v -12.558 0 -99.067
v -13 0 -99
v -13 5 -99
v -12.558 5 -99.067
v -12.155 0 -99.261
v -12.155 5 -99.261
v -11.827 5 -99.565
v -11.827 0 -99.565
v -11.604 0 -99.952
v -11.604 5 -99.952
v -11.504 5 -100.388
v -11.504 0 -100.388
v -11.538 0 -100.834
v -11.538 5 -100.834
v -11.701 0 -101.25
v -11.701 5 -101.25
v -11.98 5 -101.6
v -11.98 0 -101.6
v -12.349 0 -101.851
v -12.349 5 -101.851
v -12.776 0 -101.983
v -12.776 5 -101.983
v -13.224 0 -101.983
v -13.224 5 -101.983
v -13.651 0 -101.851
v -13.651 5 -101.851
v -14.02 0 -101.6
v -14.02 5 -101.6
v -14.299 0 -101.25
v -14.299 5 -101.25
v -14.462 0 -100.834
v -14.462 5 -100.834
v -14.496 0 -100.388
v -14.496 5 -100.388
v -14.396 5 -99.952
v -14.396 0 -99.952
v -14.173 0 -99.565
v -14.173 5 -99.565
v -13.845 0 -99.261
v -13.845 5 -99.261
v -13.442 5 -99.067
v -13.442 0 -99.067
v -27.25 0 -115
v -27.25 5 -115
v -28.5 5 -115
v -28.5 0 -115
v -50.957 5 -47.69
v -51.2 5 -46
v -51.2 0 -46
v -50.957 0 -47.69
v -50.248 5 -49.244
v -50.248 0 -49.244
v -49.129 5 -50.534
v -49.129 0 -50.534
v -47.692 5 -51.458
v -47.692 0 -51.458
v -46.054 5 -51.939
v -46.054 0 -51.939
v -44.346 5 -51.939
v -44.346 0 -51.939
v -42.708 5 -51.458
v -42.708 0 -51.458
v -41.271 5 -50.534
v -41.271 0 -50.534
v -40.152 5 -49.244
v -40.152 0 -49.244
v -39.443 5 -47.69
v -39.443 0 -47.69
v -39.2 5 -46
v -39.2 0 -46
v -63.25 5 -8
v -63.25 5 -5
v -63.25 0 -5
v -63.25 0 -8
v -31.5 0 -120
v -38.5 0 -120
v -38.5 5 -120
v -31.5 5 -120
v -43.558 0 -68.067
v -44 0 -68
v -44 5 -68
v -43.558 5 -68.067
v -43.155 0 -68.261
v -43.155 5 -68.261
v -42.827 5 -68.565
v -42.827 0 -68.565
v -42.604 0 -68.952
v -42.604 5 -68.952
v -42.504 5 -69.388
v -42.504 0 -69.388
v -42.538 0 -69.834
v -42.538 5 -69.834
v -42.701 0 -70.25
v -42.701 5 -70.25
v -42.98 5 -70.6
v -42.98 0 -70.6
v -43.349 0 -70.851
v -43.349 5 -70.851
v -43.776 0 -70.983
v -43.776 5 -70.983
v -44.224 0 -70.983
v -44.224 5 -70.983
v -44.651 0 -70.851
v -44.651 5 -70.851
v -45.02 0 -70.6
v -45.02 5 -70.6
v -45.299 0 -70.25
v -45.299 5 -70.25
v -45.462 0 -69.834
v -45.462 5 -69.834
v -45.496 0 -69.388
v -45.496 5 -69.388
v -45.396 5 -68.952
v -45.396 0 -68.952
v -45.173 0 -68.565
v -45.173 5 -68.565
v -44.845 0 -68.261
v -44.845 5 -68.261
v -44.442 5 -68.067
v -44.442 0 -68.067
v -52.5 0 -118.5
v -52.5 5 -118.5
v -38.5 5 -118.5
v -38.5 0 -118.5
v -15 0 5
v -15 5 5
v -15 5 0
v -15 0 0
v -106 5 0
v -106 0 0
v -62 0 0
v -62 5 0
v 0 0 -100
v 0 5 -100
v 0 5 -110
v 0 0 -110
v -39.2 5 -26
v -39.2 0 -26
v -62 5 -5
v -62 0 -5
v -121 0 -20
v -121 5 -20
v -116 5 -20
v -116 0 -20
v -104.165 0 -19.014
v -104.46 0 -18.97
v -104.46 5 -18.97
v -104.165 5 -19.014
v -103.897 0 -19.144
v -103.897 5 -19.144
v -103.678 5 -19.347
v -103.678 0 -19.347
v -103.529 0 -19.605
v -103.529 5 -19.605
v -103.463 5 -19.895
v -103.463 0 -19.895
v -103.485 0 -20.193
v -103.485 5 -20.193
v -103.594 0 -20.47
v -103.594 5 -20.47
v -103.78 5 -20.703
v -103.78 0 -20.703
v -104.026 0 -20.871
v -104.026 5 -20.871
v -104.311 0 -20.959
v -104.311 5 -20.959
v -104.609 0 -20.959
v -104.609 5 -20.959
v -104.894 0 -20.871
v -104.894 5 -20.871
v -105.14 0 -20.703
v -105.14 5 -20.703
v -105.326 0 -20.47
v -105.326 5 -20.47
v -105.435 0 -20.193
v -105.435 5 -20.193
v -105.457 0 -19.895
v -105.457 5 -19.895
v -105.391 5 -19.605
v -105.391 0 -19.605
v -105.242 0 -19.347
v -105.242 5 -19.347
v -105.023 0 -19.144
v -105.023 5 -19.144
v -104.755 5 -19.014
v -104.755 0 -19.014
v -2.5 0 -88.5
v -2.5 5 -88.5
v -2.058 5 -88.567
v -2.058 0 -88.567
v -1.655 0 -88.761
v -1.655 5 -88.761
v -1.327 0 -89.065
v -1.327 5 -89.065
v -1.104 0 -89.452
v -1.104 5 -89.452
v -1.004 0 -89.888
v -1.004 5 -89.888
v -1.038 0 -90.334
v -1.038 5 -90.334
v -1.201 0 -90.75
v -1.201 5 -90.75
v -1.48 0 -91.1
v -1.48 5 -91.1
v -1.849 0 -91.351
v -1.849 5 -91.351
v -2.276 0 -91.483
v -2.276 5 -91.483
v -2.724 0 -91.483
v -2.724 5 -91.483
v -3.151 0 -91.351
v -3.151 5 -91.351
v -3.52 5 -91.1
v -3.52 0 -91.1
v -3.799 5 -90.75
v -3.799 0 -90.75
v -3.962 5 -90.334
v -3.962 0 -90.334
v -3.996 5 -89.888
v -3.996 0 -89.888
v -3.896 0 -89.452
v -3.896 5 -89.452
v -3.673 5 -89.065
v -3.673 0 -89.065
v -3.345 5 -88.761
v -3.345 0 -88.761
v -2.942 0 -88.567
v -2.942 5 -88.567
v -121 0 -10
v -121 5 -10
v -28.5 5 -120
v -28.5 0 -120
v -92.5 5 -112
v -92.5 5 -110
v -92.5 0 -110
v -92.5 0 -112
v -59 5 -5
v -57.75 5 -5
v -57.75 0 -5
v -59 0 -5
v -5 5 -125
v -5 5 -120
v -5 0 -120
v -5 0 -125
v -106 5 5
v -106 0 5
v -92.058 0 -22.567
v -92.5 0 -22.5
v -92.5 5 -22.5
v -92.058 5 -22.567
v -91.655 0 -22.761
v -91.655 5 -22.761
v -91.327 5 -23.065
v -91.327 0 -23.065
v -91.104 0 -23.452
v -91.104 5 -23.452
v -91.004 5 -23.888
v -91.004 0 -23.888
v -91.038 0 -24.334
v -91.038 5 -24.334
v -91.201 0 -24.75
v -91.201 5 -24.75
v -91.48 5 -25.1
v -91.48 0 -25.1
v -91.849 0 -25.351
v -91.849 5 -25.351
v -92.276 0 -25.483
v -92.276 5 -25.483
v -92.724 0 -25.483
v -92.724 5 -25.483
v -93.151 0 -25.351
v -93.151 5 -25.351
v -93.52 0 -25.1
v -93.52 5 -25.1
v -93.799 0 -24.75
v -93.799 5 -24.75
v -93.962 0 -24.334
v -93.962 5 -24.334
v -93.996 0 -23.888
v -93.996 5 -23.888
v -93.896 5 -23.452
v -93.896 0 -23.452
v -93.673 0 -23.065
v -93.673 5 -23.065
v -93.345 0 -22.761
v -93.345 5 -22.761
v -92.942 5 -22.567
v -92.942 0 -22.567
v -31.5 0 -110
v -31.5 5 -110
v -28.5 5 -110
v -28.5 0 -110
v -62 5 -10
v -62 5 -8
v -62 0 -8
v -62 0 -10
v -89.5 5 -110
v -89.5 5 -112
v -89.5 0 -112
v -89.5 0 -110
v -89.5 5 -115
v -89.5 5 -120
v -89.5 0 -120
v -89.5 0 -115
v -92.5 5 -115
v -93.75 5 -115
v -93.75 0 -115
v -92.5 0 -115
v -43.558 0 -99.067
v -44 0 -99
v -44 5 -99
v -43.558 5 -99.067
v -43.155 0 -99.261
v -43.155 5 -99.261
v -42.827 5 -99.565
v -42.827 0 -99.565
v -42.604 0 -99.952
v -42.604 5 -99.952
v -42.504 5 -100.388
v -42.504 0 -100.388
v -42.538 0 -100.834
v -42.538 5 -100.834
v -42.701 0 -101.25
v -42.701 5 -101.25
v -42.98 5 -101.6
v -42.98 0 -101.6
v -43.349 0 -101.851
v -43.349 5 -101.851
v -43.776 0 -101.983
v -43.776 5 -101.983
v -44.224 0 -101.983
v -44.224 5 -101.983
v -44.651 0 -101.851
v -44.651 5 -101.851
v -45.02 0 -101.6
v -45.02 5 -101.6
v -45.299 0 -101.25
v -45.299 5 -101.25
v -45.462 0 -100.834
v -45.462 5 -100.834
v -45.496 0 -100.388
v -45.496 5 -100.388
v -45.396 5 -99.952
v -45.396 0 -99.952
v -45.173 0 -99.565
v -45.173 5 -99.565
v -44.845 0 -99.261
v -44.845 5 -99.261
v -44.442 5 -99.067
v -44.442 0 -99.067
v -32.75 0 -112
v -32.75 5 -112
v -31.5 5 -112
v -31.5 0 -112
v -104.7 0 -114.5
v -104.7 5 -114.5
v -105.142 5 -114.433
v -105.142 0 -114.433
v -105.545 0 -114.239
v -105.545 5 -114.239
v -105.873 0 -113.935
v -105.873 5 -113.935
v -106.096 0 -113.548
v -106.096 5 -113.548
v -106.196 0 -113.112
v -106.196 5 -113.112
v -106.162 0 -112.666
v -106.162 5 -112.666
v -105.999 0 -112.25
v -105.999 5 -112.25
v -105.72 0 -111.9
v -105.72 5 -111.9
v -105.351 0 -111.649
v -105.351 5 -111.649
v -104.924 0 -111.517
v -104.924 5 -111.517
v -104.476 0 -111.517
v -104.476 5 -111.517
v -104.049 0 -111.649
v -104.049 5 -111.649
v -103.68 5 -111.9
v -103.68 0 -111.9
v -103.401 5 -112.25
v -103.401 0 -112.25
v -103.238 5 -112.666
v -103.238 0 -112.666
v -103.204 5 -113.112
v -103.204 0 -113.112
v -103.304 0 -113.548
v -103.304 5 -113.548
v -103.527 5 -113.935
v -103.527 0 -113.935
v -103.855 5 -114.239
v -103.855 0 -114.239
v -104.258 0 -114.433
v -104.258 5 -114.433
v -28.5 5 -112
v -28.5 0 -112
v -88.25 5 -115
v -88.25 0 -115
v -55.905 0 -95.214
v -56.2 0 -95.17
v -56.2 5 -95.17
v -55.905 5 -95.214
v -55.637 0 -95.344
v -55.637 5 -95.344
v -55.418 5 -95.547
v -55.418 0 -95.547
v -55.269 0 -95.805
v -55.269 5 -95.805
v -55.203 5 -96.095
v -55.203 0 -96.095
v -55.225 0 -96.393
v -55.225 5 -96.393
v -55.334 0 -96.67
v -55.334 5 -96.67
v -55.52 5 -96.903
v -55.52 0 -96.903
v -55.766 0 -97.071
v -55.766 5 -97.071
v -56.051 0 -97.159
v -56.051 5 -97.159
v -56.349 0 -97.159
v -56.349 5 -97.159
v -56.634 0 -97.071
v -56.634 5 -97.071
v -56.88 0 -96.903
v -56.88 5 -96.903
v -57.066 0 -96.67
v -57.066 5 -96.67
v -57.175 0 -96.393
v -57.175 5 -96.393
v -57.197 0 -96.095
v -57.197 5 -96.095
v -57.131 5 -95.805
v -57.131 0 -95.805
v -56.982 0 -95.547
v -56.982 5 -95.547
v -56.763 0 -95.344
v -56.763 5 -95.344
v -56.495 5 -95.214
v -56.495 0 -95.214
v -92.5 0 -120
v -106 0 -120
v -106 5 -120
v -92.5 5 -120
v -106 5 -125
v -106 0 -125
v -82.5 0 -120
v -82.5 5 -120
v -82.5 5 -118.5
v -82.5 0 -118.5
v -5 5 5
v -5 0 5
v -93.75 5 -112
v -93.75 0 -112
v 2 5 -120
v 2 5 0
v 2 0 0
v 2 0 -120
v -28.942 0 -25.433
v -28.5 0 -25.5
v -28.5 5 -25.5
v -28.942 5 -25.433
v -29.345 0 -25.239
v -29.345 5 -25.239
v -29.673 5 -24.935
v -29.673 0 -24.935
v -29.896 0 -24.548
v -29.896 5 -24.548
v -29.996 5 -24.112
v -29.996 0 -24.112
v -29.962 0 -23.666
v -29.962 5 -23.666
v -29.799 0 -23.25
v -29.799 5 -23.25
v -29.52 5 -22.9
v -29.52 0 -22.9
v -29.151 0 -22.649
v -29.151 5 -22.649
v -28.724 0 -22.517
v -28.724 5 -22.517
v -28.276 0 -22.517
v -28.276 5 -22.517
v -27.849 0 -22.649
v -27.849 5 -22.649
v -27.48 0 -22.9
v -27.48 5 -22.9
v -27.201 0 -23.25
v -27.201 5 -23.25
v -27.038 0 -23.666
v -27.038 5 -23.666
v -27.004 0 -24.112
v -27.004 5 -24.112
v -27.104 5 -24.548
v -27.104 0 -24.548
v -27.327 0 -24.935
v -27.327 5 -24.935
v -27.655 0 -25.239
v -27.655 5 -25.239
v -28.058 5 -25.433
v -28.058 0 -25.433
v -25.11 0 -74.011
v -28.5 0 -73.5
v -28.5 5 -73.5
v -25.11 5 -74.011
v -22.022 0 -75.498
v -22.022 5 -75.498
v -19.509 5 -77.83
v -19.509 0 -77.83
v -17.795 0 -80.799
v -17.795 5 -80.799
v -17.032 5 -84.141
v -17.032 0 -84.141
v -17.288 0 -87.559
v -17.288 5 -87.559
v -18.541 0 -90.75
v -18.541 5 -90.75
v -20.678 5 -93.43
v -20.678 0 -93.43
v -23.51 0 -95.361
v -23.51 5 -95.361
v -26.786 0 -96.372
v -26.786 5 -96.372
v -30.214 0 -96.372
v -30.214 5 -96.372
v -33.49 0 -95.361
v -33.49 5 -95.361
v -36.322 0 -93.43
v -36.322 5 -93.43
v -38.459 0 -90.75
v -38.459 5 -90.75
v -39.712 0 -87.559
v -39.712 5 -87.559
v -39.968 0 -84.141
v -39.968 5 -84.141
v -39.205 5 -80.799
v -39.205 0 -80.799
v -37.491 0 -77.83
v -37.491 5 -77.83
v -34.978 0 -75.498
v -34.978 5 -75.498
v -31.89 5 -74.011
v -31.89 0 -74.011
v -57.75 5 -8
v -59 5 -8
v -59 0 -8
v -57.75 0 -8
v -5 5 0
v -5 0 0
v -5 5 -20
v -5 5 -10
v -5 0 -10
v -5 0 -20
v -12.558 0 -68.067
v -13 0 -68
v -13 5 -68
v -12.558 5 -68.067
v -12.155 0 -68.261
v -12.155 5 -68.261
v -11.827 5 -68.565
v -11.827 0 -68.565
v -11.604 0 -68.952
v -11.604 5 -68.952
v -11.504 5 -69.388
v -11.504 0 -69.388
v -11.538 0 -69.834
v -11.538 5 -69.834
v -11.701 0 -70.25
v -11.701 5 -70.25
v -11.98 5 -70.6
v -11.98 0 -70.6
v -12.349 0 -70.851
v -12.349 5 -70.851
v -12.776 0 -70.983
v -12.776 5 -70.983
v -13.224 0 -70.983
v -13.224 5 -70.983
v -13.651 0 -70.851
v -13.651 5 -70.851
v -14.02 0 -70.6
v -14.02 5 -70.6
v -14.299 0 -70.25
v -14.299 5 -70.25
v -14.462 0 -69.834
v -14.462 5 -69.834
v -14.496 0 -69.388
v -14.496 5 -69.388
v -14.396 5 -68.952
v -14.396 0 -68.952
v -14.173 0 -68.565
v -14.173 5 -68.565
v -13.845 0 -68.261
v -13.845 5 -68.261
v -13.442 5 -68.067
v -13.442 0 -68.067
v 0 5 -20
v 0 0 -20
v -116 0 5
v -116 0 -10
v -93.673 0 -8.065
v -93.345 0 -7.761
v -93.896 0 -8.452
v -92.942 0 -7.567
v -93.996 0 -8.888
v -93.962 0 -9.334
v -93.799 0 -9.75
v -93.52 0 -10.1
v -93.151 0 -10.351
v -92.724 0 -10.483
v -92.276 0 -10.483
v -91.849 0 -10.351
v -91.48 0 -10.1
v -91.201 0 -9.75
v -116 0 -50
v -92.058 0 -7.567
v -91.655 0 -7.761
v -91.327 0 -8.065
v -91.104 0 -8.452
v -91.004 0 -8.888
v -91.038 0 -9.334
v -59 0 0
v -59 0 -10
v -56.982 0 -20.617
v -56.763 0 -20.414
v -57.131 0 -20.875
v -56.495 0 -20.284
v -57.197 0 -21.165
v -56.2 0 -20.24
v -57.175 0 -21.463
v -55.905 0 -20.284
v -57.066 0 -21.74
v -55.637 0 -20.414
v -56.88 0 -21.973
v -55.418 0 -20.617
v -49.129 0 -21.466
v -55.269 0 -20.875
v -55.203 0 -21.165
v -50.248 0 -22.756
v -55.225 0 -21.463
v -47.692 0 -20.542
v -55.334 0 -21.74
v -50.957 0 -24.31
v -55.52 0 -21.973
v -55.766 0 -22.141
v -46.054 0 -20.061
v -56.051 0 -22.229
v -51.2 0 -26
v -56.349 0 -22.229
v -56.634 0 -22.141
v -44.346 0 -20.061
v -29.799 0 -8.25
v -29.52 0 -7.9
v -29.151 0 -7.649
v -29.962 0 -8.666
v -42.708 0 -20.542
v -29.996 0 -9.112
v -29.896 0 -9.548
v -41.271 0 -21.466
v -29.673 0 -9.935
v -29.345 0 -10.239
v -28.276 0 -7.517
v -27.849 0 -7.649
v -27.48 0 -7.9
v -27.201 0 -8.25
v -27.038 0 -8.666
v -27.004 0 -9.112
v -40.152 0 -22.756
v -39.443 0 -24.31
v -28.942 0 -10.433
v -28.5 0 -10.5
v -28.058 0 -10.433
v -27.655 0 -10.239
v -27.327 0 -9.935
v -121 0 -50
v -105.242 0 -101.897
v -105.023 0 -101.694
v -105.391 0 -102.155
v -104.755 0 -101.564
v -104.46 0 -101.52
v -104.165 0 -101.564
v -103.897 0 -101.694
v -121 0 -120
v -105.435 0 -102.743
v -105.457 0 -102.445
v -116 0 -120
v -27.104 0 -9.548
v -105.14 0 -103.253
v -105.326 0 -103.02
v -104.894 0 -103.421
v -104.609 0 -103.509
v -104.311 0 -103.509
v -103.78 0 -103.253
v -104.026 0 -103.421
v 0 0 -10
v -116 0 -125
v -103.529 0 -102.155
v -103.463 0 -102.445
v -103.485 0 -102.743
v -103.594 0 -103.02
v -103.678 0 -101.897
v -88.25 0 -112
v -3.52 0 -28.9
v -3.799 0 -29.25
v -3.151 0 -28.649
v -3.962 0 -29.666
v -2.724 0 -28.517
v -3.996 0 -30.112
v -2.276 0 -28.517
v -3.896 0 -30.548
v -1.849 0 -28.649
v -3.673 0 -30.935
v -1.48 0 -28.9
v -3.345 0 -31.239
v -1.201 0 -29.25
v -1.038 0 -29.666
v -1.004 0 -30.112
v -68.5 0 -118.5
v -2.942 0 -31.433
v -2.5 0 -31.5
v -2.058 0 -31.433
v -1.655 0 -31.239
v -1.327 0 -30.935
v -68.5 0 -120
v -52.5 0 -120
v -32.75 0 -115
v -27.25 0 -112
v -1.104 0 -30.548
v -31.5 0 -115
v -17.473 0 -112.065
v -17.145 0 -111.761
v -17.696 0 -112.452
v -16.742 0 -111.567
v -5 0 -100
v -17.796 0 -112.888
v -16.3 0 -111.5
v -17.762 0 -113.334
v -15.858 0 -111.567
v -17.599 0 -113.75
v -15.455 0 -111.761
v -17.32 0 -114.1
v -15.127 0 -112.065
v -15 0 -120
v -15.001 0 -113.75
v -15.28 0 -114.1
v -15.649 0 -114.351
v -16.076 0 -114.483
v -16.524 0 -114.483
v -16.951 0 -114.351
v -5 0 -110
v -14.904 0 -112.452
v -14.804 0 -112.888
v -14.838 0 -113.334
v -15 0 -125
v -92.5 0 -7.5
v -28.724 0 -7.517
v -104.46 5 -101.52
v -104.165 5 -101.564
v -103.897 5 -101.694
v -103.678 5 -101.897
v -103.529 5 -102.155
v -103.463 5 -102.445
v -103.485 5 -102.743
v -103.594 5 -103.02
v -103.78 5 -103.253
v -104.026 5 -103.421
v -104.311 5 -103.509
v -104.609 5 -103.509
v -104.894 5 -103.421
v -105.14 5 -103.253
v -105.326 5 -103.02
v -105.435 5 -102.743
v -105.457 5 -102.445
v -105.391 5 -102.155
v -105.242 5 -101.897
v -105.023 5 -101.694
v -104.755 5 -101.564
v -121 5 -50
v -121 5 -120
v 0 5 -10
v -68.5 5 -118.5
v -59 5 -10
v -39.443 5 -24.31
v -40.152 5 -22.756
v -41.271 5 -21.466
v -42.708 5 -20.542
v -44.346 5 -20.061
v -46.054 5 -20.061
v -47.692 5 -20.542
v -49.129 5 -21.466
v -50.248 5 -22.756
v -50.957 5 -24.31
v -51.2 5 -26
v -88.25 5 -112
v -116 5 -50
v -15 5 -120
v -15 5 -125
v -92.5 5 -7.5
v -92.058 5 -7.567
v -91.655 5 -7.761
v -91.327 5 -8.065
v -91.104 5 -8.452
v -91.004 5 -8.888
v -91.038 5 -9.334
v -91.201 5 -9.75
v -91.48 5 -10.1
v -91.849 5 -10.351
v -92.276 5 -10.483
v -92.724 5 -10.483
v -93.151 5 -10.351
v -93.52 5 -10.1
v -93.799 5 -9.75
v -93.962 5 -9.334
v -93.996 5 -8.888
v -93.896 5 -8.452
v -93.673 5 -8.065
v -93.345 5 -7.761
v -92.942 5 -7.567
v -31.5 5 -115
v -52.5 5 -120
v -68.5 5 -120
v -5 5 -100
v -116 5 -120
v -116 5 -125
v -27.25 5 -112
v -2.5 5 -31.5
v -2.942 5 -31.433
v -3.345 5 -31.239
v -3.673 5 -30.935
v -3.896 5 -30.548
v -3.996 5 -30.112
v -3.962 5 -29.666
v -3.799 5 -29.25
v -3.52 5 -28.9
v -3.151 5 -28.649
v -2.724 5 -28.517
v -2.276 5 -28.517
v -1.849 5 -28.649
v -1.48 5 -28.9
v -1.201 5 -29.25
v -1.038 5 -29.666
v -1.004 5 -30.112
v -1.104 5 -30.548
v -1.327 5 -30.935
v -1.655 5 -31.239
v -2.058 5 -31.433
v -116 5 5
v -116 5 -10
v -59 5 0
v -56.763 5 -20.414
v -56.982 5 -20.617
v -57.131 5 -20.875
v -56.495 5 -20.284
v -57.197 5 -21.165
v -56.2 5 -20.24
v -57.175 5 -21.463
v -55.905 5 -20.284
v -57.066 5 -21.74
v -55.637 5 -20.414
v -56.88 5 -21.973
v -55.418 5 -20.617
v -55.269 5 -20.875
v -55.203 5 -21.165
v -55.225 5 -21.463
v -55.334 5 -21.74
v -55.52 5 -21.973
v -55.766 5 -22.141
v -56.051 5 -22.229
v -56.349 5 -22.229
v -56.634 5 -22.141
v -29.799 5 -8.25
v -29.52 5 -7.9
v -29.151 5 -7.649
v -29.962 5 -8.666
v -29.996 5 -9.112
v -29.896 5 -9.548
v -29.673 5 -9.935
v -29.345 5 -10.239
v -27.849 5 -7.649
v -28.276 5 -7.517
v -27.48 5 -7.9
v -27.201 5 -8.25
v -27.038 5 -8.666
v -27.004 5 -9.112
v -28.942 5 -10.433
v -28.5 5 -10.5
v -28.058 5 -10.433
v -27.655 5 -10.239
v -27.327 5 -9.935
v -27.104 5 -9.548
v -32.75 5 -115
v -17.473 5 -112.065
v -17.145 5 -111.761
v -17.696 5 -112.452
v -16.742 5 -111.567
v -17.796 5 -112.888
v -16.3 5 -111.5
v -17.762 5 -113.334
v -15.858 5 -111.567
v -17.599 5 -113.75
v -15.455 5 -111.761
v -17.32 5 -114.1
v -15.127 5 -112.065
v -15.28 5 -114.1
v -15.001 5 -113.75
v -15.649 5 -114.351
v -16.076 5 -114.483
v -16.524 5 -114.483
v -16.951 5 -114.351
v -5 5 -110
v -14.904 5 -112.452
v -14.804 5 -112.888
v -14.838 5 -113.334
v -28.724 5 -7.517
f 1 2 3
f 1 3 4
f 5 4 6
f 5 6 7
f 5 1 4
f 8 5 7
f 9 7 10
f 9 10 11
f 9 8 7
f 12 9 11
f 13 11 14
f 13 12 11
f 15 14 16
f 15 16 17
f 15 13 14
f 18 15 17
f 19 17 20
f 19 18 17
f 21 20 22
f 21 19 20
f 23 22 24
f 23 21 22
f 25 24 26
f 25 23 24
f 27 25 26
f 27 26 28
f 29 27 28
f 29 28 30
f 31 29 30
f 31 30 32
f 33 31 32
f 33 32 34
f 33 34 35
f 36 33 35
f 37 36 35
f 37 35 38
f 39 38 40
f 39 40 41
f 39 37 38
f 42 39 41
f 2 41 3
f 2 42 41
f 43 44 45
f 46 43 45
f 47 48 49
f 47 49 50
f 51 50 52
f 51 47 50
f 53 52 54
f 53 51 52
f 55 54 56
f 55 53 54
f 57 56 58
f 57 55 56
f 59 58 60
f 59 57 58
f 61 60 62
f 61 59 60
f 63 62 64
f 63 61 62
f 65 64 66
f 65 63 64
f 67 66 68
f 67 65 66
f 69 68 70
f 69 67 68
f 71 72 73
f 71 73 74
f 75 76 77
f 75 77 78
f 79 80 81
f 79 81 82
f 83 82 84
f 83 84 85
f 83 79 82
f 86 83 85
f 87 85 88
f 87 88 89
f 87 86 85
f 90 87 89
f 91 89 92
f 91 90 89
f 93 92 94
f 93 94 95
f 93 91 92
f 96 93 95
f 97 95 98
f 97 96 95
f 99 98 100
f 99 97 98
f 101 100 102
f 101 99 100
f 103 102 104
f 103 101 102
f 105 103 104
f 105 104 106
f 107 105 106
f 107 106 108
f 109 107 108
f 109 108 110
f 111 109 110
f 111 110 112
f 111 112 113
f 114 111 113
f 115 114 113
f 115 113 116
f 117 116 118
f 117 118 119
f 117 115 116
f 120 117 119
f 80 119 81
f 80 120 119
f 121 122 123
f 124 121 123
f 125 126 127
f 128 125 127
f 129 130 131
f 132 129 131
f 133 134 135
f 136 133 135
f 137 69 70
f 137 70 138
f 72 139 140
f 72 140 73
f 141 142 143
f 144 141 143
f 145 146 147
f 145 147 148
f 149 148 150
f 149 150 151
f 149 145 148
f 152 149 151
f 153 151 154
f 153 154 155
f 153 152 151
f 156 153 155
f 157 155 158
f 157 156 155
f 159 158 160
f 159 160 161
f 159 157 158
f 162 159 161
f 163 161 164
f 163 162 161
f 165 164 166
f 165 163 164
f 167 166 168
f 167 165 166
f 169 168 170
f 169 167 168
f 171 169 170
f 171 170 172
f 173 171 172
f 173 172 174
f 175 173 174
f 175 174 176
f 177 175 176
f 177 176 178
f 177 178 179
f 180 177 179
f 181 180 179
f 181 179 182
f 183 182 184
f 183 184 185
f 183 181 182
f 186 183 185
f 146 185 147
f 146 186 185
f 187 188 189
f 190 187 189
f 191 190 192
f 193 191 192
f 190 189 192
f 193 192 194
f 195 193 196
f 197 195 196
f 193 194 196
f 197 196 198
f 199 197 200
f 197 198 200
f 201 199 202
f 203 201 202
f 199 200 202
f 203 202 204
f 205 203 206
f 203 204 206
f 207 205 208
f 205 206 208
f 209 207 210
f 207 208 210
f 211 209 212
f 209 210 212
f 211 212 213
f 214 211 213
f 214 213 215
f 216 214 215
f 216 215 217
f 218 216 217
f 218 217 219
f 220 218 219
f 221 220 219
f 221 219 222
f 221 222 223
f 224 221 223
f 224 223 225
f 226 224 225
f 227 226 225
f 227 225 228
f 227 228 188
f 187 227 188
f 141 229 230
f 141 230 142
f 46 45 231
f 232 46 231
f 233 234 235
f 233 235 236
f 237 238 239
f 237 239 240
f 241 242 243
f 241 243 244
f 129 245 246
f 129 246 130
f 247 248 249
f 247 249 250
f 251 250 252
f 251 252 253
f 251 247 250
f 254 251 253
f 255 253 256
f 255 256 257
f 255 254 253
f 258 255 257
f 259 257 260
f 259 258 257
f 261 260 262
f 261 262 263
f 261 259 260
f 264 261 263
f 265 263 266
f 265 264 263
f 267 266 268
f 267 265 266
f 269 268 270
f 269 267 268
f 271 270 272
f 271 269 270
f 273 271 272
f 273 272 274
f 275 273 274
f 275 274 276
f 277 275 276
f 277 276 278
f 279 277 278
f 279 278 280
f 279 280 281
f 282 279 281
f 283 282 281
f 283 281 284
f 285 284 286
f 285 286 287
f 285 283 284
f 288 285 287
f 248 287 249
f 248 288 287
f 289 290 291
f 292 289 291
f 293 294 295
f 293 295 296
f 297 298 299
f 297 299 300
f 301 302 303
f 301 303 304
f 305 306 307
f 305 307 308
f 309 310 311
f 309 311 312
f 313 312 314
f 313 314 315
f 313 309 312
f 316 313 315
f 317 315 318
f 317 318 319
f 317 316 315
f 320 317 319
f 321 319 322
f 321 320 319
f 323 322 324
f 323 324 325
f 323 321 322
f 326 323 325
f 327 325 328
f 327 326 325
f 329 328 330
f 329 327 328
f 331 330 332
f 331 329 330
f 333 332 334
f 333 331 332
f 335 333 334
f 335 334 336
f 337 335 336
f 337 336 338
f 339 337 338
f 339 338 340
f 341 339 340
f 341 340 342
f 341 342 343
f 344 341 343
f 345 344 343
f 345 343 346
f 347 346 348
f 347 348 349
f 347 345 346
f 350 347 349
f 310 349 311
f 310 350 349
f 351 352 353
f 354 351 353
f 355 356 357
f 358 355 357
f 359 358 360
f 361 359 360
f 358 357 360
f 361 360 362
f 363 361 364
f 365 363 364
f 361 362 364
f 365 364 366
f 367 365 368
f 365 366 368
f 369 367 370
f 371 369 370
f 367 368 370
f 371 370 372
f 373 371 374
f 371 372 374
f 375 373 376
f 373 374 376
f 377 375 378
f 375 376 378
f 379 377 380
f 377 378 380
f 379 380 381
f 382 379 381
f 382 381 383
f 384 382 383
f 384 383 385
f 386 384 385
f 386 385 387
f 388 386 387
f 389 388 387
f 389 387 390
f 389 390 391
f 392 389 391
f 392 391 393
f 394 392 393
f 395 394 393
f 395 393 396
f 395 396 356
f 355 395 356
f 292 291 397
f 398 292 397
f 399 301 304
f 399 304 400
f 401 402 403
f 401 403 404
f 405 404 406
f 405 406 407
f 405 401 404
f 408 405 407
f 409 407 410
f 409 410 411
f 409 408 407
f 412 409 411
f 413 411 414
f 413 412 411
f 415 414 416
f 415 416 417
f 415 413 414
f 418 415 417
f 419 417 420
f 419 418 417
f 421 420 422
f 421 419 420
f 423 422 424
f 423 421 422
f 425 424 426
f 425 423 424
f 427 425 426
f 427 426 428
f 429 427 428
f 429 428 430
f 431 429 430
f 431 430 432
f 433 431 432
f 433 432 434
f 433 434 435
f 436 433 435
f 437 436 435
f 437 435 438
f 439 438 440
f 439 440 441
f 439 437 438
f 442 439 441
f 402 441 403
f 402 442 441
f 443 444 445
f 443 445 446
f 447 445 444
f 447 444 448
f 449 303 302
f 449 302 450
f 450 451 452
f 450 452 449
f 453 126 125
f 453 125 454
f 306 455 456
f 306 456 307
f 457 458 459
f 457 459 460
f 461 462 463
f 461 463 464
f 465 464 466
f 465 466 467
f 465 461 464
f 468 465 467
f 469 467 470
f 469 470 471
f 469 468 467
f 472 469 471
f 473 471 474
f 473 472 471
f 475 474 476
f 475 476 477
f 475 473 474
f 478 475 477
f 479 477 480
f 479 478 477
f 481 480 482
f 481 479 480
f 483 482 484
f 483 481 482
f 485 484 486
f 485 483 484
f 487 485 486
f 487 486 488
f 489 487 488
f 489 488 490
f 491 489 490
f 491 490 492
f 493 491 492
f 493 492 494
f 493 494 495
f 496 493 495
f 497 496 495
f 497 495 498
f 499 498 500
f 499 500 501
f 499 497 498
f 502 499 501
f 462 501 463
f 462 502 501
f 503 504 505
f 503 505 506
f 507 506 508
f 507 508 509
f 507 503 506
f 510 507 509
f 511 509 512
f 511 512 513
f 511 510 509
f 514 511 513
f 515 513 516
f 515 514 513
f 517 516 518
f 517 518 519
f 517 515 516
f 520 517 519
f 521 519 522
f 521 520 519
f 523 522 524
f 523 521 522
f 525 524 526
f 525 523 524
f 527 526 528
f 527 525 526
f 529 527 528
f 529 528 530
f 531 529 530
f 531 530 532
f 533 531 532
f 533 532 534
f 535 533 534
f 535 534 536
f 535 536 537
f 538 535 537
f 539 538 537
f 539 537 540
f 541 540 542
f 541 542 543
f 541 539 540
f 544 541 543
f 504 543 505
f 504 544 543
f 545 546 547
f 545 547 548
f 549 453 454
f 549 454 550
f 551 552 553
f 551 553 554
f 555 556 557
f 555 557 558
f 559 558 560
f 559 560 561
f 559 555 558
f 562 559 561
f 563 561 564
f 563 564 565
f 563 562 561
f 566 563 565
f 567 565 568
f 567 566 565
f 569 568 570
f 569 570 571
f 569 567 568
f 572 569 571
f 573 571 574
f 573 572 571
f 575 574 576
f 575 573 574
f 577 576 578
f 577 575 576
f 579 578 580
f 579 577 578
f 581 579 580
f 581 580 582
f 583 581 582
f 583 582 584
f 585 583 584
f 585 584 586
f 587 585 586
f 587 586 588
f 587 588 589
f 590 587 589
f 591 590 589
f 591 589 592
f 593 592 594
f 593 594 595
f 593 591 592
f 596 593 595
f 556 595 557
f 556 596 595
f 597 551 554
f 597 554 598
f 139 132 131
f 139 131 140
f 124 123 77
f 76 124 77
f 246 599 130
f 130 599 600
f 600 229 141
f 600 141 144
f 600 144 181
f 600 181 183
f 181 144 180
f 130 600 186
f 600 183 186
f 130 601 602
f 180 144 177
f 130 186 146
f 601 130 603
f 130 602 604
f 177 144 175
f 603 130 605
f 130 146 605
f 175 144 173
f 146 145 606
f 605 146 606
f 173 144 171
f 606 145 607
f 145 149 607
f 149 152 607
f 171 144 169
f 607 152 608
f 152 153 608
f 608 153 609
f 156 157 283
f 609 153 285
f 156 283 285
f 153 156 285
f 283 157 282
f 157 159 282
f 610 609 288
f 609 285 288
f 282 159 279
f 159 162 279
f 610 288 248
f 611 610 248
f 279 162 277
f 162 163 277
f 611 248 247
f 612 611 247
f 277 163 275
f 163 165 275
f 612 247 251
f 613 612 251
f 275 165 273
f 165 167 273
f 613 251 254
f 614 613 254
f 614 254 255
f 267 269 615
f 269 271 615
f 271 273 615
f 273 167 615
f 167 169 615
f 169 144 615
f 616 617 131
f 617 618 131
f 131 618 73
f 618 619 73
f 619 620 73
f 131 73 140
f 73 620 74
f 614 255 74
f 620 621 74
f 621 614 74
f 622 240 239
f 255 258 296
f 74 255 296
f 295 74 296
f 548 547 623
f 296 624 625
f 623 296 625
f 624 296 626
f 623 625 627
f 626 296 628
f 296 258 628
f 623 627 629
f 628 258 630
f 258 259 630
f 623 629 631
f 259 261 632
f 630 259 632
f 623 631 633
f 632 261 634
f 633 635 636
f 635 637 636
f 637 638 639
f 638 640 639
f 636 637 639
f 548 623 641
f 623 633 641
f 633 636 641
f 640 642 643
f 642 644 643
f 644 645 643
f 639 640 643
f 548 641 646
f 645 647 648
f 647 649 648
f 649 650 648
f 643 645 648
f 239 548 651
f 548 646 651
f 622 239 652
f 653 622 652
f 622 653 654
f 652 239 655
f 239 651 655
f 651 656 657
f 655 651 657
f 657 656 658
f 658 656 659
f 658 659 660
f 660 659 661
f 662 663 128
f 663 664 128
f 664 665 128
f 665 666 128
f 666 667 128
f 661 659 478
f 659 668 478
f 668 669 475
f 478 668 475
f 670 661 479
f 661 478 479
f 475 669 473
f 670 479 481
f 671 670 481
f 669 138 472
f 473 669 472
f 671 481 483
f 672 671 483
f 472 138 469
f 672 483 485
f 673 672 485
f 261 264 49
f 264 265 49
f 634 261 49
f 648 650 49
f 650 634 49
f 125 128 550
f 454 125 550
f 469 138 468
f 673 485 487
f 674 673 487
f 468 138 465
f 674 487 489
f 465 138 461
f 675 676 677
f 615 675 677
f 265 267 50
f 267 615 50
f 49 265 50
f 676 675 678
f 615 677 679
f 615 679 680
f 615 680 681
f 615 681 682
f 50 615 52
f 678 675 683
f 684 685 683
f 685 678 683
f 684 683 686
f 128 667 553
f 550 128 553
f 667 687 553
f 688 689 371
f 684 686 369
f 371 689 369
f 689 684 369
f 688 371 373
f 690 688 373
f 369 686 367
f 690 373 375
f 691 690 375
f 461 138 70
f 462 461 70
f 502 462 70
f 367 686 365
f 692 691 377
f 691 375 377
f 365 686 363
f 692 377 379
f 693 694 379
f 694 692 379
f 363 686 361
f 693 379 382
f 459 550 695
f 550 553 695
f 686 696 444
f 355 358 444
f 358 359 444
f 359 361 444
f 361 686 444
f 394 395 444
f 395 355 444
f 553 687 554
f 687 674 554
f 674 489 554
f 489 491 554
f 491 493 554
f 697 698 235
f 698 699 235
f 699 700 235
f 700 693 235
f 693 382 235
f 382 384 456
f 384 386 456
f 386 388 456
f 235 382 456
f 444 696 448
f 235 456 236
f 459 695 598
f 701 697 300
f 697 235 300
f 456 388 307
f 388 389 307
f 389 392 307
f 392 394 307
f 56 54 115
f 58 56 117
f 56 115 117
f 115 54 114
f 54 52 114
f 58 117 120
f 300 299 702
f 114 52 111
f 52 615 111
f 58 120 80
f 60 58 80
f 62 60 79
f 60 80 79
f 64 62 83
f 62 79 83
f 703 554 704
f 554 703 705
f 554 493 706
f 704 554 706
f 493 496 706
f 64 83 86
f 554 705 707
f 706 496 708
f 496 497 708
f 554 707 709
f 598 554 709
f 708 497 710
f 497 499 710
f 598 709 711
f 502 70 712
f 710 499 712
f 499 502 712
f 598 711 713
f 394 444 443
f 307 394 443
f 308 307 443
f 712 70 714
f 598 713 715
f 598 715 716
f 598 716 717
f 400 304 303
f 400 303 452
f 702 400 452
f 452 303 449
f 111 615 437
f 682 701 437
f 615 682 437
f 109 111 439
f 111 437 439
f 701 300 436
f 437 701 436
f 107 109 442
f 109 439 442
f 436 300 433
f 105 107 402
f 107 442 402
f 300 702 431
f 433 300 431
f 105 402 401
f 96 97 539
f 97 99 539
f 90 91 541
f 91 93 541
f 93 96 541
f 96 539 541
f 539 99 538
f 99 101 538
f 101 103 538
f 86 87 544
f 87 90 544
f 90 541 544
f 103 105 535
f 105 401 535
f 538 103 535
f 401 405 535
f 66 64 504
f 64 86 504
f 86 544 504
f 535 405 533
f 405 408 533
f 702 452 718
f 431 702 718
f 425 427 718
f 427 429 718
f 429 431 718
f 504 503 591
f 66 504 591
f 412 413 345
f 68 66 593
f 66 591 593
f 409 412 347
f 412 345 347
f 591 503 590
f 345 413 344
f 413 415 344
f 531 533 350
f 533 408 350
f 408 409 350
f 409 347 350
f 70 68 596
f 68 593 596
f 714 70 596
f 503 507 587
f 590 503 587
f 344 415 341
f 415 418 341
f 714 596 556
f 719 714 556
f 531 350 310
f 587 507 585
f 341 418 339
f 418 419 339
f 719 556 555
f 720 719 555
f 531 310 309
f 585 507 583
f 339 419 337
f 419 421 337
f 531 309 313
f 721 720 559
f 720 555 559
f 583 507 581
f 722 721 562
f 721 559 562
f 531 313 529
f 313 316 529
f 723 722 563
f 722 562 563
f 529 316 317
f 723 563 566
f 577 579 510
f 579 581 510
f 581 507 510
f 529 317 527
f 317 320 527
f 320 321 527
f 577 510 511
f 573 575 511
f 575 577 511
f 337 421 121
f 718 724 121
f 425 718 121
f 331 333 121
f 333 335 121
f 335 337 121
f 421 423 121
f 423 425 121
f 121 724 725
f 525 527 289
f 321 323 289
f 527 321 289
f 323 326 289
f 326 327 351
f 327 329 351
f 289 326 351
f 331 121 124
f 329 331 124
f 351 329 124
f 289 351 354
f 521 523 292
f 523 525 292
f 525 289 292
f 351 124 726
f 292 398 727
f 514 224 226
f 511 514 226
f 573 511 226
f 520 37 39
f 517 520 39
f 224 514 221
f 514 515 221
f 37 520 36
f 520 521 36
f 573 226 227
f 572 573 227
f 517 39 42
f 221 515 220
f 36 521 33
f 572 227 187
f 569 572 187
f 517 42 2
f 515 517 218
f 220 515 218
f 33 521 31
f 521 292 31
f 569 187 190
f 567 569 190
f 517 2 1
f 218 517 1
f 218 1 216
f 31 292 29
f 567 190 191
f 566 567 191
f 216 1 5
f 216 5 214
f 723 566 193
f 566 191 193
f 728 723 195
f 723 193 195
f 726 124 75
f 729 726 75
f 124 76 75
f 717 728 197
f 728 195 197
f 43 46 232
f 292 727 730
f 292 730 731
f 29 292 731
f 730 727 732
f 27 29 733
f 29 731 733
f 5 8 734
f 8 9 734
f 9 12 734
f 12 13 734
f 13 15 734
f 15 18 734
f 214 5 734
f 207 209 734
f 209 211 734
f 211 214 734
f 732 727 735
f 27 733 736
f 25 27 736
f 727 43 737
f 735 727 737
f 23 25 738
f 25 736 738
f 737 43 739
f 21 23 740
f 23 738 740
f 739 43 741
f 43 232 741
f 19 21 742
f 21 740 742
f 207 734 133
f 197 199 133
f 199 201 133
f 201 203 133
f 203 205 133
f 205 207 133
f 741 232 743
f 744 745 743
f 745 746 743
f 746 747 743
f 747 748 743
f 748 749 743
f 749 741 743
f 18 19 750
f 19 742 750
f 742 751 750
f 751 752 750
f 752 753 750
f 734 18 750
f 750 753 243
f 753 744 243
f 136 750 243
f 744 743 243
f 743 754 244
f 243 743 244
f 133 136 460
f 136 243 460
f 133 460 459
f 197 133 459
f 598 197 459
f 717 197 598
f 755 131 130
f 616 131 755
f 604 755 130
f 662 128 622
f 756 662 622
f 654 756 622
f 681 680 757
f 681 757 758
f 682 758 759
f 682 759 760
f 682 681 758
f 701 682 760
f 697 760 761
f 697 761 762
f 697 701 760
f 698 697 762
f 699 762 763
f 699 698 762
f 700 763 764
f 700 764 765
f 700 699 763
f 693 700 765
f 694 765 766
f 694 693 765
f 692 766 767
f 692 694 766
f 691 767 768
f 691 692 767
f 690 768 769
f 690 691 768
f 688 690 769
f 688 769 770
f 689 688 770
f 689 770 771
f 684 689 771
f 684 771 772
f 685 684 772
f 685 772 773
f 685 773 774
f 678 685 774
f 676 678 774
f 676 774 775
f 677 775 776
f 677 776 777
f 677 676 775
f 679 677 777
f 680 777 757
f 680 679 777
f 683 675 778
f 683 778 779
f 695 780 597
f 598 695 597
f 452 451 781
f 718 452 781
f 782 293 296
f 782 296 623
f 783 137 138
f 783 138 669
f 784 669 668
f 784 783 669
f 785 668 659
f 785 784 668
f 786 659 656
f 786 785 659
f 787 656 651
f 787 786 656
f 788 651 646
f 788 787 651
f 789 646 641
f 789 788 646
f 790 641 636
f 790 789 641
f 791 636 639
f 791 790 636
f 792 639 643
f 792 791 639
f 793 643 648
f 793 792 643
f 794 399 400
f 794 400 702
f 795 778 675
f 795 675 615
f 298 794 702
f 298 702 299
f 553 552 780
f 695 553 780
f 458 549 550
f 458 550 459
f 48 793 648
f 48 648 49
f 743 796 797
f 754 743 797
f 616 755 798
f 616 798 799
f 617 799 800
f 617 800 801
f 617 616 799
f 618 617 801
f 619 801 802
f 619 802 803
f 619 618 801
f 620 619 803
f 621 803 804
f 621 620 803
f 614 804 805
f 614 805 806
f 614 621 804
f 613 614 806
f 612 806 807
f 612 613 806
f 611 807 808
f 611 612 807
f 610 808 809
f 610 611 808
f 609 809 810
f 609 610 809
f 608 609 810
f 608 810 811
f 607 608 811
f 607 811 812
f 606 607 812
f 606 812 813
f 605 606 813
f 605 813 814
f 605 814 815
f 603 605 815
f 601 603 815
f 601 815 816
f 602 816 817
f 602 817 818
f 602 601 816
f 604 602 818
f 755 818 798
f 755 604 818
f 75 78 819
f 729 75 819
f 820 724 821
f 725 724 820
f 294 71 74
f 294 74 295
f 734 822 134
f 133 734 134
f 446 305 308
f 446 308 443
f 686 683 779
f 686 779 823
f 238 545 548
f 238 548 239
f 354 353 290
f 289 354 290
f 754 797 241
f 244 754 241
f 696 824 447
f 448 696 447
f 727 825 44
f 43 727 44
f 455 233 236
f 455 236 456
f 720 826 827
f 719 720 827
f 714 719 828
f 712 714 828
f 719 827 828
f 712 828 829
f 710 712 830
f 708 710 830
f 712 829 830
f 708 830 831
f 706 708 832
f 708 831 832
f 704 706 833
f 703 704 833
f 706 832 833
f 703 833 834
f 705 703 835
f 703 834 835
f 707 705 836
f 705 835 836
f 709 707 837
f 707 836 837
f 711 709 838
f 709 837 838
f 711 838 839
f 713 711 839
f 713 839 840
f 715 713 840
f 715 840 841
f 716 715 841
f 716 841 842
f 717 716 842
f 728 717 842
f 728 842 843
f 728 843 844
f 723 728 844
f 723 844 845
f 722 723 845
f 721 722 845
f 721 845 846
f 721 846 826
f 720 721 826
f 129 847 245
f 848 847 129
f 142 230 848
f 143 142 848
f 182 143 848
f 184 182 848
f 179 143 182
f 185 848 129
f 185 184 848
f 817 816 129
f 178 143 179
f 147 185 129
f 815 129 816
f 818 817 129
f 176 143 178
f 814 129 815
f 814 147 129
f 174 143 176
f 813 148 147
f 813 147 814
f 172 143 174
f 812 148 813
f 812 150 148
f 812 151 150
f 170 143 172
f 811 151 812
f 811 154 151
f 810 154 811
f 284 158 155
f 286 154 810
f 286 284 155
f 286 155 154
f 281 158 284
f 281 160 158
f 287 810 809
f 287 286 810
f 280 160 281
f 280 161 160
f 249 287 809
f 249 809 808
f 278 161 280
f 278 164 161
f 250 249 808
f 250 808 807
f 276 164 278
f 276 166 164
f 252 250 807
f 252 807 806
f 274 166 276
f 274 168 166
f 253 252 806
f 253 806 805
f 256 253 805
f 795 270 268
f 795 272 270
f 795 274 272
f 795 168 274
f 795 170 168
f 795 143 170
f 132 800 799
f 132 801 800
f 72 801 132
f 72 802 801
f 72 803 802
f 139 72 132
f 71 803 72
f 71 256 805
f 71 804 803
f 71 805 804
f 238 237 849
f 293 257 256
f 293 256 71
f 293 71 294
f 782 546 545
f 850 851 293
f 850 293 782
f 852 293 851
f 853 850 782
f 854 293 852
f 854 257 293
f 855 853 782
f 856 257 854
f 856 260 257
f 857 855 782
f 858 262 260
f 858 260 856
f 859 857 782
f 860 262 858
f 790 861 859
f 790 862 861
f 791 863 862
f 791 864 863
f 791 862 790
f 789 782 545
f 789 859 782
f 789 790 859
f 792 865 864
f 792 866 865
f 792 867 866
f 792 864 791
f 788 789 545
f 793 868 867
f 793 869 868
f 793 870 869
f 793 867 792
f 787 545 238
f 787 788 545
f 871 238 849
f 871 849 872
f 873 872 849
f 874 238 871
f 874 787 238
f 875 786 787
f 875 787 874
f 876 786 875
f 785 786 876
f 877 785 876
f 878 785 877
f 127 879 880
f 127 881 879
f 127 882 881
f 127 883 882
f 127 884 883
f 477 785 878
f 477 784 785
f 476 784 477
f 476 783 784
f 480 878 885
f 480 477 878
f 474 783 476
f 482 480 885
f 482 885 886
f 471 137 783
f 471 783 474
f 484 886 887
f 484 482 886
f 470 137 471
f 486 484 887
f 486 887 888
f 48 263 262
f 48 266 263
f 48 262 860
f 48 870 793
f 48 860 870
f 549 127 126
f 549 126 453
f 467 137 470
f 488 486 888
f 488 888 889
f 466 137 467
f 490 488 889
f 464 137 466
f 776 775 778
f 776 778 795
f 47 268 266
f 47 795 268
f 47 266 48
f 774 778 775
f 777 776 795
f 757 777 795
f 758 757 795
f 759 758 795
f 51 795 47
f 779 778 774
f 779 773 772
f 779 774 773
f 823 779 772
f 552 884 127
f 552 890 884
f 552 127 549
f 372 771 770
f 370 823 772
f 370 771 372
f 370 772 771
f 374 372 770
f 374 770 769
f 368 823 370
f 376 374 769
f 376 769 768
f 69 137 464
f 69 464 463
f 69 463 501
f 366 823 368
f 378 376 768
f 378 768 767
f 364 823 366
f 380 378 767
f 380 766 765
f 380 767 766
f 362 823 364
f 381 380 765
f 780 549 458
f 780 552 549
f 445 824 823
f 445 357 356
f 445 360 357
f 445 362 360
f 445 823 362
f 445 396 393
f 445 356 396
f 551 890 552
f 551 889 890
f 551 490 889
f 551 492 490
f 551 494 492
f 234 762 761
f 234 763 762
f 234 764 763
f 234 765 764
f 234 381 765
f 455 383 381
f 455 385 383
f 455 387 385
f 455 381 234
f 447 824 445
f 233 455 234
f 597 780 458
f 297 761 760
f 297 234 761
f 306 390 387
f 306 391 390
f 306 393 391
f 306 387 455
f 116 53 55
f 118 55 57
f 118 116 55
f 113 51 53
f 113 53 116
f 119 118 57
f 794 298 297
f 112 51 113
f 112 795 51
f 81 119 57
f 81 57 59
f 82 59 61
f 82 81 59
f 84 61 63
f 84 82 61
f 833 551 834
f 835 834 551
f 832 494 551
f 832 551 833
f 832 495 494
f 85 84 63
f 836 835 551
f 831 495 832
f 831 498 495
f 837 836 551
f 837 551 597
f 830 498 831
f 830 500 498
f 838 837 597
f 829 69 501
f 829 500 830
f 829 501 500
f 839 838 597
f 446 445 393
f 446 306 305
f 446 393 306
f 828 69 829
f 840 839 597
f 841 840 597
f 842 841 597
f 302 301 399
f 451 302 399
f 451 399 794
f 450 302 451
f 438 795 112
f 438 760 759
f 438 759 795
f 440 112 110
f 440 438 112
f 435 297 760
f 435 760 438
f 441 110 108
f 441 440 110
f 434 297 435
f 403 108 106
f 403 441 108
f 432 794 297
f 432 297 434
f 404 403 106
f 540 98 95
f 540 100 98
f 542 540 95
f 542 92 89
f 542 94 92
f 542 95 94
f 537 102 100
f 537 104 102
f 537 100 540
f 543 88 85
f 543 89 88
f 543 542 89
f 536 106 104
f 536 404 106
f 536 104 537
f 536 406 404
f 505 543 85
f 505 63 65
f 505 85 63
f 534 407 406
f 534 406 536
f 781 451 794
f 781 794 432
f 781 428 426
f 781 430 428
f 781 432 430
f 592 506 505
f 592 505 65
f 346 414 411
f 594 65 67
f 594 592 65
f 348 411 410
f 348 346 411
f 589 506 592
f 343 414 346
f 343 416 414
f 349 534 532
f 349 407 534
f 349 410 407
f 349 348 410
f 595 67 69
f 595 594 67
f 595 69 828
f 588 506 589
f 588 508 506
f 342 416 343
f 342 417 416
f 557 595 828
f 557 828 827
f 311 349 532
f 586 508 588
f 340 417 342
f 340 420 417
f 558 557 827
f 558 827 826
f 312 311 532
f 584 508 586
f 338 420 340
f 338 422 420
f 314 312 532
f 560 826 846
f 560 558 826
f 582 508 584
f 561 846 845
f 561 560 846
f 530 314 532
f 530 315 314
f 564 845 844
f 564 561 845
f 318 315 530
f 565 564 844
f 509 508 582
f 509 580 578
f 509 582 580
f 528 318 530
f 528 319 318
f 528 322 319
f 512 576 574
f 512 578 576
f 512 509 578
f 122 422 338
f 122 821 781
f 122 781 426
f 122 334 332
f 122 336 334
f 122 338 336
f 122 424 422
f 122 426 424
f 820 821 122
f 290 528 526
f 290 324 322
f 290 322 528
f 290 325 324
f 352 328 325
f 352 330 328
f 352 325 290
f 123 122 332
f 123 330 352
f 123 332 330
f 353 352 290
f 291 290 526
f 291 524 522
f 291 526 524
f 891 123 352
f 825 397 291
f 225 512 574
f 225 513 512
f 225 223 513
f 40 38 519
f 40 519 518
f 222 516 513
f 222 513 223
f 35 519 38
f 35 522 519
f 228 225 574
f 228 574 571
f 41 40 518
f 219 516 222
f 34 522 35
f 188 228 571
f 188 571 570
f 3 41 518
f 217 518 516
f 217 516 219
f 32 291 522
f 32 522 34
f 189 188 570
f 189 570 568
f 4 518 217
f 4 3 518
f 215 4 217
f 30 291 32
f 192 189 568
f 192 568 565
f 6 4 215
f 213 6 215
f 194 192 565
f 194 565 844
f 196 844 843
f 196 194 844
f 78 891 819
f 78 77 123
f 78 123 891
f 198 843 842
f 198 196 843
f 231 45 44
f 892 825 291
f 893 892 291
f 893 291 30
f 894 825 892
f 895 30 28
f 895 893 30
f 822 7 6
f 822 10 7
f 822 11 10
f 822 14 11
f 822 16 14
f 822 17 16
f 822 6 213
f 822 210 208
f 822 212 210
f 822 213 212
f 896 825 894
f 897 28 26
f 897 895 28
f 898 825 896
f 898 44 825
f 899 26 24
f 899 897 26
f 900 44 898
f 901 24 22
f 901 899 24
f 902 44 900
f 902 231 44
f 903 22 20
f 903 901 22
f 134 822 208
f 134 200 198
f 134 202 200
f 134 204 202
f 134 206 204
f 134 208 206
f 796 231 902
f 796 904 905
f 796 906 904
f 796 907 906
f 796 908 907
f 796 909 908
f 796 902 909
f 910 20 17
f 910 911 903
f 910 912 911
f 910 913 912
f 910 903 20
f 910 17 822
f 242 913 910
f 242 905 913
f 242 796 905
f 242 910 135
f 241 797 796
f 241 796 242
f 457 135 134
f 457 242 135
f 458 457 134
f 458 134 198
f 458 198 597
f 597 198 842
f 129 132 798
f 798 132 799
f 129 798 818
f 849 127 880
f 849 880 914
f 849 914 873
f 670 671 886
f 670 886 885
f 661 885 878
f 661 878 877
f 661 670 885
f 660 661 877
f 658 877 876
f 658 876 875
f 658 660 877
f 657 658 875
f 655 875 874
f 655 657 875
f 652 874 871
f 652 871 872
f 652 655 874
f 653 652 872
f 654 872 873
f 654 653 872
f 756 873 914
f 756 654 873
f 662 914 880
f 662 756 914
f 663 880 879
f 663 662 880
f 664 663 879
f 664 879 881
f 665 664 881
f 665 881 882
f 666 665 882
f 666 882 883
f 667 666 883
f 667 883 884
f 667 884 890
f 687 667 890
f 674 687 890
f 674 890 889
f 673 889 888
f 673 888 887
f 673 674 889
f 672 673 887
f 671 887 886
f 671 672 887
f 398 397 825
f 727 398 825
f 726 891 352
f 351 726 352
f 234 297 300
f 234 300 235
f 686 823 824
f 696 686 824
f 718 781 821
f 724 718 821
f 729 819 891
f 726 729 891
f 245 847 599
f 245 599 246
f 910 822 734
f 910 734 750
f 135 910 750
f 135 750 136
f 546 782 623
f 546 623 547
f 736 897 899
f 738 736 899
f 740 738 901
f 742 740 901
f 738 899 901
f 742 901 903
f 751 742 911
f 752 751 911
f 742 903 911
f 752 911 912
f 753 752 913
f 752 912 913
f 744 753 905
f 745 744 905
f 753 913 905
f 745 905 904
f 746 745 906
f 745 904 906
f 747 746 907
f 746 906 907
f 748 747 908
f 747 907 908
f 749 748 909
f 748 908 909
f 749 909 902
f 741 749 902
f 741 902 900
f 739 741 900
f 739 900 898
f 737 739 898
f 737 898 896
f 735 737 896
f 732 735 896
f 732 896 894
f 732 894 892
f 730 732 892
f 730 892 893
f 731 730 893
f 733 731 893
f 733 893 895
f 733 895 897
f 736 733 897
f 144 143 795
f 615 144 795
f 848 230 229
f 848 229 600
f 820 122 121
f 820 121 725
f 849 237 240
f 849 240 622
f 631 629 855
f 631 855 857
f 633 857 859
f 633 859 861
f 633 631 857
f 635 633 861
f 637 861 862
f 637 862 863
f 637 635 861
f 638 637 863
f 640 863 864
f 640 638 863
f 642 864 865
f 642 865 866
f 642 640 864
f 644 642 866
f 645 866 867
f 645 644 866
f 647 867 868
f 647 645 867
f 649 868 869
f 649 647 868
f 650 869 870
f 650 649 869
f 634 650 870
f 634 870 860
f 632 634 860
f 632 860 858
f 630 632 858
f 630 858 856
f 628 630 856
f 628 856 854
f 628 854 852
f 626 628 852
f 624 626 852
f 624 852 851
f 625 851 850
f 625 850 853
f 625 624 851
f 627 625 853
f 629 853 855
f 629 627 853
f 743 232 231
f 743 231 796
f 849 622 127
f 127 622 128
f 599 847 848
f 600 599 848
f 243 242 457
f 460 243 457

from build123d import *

# Parameters (mm, degrees)
SKETCH2_W           = 121
SKETCH2_H           = 120
SKETCH2_R           = 11.5
SKETCH2_R_2         = 1.5
SKETCH2_R_3         = 1
BOSS_EXTRUDE1_DEPTH = 5
SKETCH3_W           = 10
SKETCH3_H           = 5
SKETCH3_W_2         = 2
SKETCH3_H_2         = 120
BOSS_EXTRUDE2_DEPTH = 5
SKETCH4_R           = 1.5
SKETCH4_W           = 5
SKETCH4_H           = 10
SKETCH4_H_2         = 30
SKETCH4_W_2         = 14
SKETCH4_H_3         = 1.5
CUT_EXTRUDE1_DEPTH  = 175.043098111


with BuildPart() as part:
    # Sketch2 → Boss-Extrude1 (new body)
    with BuildSketch(Plane(origin=(0, 0, 0), x_dir=(1, 0, 0), z_dir=(0, 1, 0))):
        with Locations((-60.5, 60)):
            Rectangle(SKETCH2_W, SKETCH2_H)
        with Locations(Location((-28.5, 85, 0), (0, 0, 270))):
            Circle(SKETCH2_R, mode=Mode.SUBTRACT)
        with Locations(Location((-44, 100.5, 0), (0, 0, 270))):
            Circle(SKETCH2_R_2, mode=Mode.SUBTRACT)
        with Locations(Location((-13, 100.5, 0), (0, 0, 270))):
            Circle(SKETCH2_R_2, mode=Mode.SUBTRACT)
        with Locations(Location((-13, 69.5, 0), (0, 0, 270))):
            Circle(SKETCH2_R_2, mode=Mode.SUBTRACT)
        with Locations(Location((-44, 69.5, 0), (0, 0, 270))):
            Circle(SKETCH2_R_2, mode=Mode.SUBTRACT)
        with Locations(Location((-92.5, 24, 0), (0, 0, 270))):
            Circle(SKETCH2_R_2, mode=Mode.SUBTRACT)
        with Locations(Location((-92.5, 9, 0), (0, 0, 270))):
            Circle(SKETCH2_R_2, mode=Mode.SUBTRACT)
        with Locations(Location((-28.5, 9, 0), (0, 0, 90))):
            Circle(SKETCH2_R_2, mode=Mode.SUBTRACT)
        with Locations(Location((-28.5, 24, 0), (0, 0, 90))):
            Circle(SKETCH2_R_2, mode=Mode.SUBTRACT)
        with Locations(Location((-104.46, 19.97, 0), (0, 0, 270))):
            Circle(SKETCH2_R_3, mode=Mode.SUBTRACT)
        with Locations(Location((-104.46, 102.52, 0), (0, 0, 270))):
            Circle(SKETCH2_R_3, mode=Mode.SUBTRACT)
        with Locations(Location((-56.2, 96.17, 0), (0, 0, 270))):
            Circle(SKETCH2_R_3, mode=Mode.SUBTRACT)
        with Locations(Location((-56.2, 21.24, 0), (0, 0, 270))):
            Circle(SKETCH2_R_3, mode=Mode.SUBTRACT)
    extrude(amount=BOSS_EXTRUDE1_DEPTH)

    # Sketch3 → Boss-Extrude2 (add)
    with BuildSketch(Plane(origin=(0, 5, 0), x_dir=(1, 0, 0), z_dir=(0, 1, 0))):
        with Locations((-111, 122.5)):
            Rectangle(SKETCH3_W, SKETCH3_H)
        with Locations((-10, 122.5)):
            Rectangle(SKETCH3_W, SKETCH3_H)
        with Locations((-10, -2.5)):
            Rectangle(SKETCH3_W, SKETCH3_H)
        with Locations((-111, -2.5)):
            Rectangle(SKETCH3_W, SKETCH3_H)
        with Locations((1, 60)):
            Rectangle(SKETCH3_W_2, SKETCH3_H_2)
    extrude(amount=-BOSS_EXTRUDE2_DEPTH)

    # Sketch4 → Cut-Extrude1 (cut, through all)
    with BuildSketch(Plane(origin=(0, 5, 0), x_dir=(1, 0, 0), z_dir=(0, 1, 0))):
        with Locations(Location((-2.5, 90, 0), (0, 0, 270))):
            Circle(SKETCH4_R)
        with Locations(Location((-2.5, 30, 0), (0, 0, 90))):
            Circle(SKETCH4_R)
        with Locations(Location((-16.3, 113, 0), (0, 0, 270))):
            Circle(SKETCH4_R)
        with Locations(Location((-104.7, 113, 0), (0, 0, 90))):
            Circle(SKETCH4_R)
        with Locations((-2.5, 105)):
            Rectangle(SKETCH4_W, SKETCH4_H)
        with Locations((-2.5, 15)):
            Rectangle(SKETCH4_W, SKETCH4_H)
        with Locations((-118.5, 35)):
            Rectangle(SKETCH4_W, SKETCH4_H_2)
        with Locations((-118.5, 5)):
            Rectangle(SKETCH4_W, SKETCH4_H)
        with Locations((-75.5, 119.25)):
            Rectangle(SKETCH4_W_2, SKETCH4_H_3)
        with Locations((-45.5, 119.25)):
            Rectangle(SKETCH4_W_2, SKETCH4_H_3)
        Polygon((-31.5, 120), (-31.5, 115), (-32.75, 115), (-32.75, 112), (-31.5, 112), (-31.5, 110), (-28.5, 110), (-28.5, 112), (-27.25, 112), (-27.25, 115), (-28.5, 115), (-28.5, 120), align=None)
        Polygon((-92.5, 120), (-89.5, 120), (-89.5, 115), (-88.25, 115), (-88.25, 112), (-89.5, 112), (-89.5, 110), (-92.5, 110), (-92.5, 112), (-93.75, 112), (-93.75, 115), (-92.5, 115), align=None)
        with BuildLine():
            Line((-51.2, 26), (-51.2, 46))
            ThreePointArc((-51.2, 46), (-45.2, 52), (-39.2, 46))
            Line((-39.2, 46), (-39.2, 26))
            ThreePointArc((-39.2, 26), (-45.2, 20), (-51.2, 26))
        make_face()
        Polygon((-62, 0), (-62, 5), (-63.25, 5), (-63.25, 8), (-62, 8), (-62, 10), (-59, 10), (-59, 8), (-57.75, 8), (-57.75, 5), (-59, 5), (-59, 0), align=None)
    extrude(amount=-CUT_EXTRUDE1_DEPTH, mode=Mode.SUBTRACT)


solid = part.part
